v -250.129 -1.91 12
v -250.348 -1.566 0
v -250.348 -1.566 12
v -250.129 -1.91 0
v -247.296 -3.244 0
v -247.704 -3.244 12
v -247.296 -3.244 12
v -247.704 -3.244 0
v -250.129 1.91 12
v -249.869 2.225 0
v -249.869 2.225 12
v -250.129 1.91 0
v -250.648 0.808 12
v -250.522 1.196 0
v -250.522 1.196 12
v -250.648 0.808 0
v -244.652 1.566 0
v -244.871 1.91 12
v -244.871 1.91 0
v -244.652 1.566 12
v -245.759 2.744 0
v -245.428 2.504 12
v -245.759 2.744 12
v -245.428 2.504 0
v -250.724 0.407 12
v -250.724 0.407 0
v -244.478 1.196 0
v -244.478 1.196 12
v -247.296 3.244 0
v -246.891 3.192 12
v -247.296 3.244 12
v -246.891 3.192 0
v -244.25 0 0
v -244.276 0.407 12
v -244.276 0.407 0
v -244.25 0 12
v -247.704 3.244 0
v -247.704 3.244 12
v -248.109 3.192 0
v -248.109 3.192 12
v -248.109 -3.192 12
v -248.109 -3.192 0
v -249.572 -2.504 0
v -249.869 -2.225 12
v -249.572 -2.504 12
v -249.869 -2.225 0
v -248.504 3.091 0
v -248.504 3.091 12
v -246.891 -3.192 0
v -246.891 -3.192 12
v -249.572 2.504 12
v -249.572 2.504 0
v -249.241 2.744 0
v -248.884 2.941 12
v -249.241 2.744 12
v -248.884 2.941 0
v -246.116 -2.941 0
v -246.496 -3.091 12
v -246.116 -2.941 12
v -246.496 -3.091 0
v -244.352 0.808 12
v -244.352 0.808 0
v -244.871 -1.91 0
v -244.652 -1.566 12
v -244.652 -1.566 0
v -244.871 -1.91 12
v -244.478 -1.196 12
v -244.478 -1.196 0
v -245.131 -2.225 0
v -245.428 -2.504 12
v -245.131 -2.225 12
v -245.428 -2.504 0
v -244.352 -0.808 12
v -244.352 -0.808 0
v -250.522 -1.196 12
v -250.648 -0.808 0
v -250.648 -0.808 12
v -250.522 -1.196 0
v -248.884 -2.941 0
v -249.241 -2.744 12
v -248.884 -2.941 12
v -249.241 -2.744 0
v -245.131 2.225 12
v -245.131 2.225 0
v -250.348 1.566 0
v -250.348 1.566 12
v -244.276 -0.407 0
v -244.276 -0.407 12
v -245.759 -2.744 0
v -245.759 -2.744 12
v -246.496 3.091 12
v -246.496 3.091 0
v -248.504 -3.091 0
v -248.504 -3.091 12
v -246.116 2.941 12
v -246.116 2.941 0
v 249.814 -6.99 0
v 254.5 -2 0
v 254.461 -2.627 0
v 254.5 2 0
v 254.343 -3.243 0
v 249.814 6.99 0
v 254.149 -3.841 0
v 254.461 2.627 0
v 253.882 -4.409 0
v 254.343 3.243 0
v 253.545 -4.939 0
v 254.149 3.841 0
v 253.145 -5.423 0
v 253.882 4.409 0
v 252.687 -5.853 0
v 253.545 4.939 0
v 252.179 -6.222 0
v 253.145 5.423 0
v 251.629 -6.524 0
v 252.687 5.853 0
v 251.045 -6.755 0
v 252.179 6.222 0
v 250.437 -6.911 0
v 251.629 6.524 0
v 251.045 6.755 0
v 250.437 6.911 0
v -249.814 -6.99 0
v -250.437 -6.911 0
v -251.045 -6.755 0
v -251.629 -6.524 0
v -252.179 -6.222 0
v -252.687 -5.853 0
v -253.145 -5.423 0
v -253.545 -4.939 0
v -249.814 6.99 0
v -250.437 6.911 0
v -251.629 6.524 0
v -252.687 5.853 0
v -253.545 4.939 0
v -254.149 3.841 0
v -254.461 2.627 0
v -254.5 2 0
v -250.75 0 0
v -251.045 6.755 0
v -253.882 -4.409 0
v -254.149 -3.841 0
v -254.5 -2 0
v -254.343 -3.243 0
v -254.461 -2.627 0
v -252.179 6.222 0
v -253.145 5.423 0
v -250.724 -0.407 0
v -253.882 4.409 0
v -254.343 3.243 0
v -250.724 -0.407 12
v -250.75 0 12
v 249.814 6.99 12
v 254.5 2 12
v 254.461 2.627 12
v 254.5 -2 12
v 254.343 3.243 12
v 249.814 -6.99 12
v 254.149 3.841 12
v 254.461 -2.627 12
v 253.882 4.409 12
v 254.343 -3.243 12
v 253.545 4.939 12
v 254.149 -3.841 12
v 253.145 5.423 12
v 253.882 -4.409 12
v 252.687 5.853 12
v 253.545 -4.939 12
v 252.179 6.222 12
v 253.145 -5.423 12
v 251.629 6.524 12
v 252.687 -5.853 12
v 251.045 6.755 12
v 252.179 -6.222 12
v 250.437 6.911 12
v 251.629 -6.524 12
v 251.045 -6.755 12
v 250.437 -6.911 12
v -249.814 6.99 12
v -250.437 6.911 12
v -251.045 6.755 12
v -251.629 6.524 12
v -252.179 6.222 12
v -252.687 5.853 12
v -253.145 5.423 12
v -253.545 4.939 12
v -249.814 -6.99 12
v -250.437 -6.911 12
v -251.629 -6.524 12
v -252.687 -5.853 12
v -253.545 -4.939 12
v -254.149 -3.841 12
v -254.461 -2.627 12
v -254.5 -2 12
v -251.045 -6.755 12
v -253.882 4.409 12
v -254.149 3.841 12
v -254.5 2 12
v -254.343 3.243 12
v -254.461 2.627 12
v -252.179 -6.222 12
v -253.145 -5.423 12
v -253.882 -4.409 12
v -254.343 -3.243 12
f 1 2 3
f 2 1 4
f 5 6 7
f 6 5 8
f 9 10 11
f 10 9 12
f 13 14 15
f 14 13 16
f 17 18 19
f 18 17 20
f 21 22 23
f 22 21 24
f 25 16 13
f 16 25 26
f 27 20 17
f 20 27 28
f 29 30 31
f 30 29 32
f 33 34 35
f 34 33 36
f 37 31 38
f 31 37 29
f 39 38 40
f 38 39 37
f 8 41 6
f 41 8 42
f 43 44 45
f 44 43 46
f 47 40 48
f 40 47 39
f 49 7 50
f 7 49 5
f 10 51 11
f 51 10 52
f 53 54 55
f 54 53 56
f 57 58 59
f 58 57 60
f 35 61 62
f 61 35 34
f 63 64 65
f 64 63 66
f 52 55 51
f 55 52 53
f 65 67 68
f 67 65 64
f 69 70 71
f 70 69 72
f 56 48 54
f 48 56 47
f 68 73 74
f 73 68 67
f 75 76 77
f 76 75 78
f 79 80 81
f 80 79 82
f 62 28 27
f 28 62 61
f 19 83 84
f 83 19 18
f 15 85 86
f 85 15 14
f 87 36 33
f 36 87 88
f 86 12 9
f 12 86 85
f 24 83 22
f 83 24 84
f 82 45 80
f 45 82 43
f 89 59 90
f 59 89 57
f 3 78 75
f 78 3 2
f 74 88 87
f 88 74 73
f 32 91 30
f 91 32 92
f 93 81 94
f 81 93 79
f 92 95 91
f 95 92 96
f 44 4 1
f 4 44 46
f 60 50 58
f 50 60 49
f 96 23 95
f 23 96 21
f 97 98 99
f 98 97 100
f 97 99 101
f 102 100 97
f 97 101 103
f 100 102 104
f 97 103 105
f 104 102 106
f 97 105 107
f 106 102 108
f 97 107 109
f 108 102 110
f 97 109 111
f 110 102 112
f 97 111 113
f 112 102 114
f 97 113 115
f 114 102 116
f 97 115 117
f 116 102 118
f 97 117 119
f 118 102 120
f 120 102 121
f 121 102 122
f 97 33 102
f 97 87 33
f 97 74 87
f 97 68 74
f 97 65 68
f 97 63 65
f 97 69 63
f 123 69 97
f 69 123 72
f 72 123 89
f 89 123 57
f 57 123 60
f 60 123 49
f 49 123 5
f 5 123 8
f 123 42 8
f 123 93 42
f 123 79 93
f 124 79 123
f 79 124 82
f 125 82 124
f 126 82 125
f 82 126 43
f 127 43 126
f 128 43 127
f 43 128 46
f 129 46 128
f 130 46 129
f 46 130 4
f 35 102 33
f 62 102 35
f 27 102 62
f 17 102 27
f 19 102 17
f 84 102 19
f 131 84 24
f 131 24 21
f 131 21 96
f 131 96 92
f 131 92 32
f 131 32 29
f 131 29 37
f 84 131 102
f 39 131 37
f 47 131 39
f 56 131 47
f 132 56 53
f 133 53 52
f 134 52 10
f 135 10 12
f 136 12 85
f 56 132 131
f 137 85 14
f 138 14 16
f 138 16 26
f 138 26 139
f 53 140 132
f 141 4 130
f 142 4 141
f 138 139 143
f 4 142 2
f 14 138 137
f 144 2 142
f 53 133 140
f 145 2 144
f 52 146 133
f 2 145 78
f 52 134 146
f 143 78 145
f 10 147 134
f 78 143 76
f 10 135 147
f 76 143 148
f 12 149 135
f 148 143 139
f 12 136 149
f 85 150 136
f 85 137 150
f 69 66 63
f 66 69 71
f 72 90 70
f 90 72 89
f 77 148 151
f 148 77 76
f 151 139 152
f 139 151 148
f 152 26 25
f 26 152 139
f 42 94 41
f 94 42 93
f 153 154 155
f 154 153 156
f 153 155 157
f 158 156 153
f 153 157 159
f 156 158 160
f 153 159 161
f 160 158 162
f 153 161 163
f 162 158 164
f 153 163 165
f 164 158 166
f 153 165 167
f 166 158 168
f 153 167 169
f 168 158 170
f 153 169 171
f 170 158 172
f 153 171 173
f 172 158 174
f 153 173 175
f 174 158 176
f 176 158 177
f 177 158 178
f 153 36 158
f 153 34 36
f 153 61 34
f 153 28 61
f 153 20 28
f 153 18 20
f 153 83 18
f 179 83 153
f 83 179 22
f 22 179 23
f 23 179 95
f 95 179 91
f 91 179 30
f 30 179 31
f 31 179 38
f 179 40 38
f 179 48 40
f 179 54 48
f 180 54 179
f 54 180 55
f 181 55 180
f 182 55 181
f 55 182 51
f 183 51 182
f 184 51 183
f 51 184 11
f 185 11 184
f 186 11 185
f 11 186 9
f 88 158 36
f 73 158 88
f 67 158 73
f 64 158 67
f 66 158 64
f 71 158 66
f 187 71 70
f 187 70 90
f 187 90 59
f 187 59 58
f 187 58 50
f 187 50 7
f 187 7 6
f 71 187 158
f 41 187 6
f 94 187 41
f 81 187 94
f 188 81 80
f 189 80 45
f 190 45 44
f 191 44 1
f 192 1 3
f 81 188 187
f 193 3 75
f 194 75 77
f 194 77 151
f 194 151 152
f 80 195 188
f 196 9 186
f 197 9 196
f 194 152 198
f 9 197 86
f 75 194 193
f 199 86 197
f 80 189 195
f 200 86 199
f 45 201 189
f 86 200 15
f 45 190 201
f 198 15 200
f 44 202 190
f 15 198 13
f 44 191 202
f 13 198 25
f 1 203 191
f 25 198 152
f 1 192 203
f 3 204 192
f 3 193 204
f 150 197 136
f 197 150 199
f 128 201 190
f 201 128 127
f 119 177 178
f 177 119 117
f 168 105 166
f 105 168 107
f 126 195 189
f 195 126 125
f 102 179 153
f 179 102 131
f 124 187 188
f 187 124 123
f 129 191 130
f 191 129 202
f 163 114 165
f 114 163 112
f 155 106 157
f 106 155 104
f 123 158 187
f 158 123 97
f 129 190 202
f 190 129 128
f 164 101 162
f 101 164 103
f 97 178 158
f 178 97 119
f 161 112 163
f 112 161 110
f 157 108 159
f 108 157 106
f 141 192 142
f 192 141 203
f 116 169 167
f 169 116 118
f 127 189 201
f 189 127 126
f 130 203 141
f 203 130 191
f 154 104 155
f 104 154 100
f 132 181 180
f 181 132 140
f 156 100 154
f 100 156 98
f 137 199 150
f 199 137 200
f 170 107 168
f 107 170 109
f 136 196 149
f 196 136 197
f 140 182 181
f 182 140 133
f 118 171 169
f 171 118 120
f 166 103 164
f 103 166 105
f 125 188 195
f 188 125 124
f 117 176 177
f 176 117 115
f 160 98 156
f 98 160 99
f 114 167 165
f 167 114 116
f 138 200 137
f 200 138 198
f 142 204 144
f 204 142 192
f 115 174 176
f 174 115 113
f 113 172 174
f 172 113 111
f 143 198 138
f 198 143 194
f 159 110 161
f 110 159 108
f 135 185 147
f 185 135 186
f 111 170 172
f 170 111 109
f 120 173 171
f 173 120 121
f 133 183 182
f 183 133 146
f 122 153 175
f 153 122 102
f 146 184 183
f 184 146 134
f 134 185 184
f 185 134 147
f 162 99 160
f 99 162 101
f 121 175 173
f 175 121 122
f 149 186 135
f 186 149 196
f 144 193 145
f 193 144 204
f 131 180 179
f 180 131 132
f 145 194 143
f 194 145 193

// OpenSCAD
$fn = 50;


difference() {
	union() {
		hull() {
			translate(v = [-249.5000000000, 2.0000000000, 0]) {
				cylinder(h = 12, r = 5);
			}
			translate(v = [249.5000000000, 2.0000000000, 0]) {
				cylinder(h = 12, r = 5);
			}
			translate(v = [-249.5000000000, -2.0000000000, 0]) {
				cylinder(h = 12, r = 5);
			}
			translate(v = [249.5000000000, -2.0000000000, 0]) {
				cylinder(h = 12, r = 5);
			}
		}
	}
	union() {
		translate(v = [-247.5000000000, 0.0000000000, 0]) {
			cylinder(h = 12, r = 3.2500000000);
		}
		translate(v = [-247.5000000000, 0.0000000000, 0]) {
			cylinder(h = 12, r = 1.8000000000);
		}
		translate(v = [-247.5000000000, 0.0000000000, 0]) {
			cylinder(h = 12, r = 1.8000000000);
		}
		translate(v = [-247.5000000000, 0.0000000000, 0]) {
			cylinder(h = 12, r = 1.8000000000);
		}
	}
}
